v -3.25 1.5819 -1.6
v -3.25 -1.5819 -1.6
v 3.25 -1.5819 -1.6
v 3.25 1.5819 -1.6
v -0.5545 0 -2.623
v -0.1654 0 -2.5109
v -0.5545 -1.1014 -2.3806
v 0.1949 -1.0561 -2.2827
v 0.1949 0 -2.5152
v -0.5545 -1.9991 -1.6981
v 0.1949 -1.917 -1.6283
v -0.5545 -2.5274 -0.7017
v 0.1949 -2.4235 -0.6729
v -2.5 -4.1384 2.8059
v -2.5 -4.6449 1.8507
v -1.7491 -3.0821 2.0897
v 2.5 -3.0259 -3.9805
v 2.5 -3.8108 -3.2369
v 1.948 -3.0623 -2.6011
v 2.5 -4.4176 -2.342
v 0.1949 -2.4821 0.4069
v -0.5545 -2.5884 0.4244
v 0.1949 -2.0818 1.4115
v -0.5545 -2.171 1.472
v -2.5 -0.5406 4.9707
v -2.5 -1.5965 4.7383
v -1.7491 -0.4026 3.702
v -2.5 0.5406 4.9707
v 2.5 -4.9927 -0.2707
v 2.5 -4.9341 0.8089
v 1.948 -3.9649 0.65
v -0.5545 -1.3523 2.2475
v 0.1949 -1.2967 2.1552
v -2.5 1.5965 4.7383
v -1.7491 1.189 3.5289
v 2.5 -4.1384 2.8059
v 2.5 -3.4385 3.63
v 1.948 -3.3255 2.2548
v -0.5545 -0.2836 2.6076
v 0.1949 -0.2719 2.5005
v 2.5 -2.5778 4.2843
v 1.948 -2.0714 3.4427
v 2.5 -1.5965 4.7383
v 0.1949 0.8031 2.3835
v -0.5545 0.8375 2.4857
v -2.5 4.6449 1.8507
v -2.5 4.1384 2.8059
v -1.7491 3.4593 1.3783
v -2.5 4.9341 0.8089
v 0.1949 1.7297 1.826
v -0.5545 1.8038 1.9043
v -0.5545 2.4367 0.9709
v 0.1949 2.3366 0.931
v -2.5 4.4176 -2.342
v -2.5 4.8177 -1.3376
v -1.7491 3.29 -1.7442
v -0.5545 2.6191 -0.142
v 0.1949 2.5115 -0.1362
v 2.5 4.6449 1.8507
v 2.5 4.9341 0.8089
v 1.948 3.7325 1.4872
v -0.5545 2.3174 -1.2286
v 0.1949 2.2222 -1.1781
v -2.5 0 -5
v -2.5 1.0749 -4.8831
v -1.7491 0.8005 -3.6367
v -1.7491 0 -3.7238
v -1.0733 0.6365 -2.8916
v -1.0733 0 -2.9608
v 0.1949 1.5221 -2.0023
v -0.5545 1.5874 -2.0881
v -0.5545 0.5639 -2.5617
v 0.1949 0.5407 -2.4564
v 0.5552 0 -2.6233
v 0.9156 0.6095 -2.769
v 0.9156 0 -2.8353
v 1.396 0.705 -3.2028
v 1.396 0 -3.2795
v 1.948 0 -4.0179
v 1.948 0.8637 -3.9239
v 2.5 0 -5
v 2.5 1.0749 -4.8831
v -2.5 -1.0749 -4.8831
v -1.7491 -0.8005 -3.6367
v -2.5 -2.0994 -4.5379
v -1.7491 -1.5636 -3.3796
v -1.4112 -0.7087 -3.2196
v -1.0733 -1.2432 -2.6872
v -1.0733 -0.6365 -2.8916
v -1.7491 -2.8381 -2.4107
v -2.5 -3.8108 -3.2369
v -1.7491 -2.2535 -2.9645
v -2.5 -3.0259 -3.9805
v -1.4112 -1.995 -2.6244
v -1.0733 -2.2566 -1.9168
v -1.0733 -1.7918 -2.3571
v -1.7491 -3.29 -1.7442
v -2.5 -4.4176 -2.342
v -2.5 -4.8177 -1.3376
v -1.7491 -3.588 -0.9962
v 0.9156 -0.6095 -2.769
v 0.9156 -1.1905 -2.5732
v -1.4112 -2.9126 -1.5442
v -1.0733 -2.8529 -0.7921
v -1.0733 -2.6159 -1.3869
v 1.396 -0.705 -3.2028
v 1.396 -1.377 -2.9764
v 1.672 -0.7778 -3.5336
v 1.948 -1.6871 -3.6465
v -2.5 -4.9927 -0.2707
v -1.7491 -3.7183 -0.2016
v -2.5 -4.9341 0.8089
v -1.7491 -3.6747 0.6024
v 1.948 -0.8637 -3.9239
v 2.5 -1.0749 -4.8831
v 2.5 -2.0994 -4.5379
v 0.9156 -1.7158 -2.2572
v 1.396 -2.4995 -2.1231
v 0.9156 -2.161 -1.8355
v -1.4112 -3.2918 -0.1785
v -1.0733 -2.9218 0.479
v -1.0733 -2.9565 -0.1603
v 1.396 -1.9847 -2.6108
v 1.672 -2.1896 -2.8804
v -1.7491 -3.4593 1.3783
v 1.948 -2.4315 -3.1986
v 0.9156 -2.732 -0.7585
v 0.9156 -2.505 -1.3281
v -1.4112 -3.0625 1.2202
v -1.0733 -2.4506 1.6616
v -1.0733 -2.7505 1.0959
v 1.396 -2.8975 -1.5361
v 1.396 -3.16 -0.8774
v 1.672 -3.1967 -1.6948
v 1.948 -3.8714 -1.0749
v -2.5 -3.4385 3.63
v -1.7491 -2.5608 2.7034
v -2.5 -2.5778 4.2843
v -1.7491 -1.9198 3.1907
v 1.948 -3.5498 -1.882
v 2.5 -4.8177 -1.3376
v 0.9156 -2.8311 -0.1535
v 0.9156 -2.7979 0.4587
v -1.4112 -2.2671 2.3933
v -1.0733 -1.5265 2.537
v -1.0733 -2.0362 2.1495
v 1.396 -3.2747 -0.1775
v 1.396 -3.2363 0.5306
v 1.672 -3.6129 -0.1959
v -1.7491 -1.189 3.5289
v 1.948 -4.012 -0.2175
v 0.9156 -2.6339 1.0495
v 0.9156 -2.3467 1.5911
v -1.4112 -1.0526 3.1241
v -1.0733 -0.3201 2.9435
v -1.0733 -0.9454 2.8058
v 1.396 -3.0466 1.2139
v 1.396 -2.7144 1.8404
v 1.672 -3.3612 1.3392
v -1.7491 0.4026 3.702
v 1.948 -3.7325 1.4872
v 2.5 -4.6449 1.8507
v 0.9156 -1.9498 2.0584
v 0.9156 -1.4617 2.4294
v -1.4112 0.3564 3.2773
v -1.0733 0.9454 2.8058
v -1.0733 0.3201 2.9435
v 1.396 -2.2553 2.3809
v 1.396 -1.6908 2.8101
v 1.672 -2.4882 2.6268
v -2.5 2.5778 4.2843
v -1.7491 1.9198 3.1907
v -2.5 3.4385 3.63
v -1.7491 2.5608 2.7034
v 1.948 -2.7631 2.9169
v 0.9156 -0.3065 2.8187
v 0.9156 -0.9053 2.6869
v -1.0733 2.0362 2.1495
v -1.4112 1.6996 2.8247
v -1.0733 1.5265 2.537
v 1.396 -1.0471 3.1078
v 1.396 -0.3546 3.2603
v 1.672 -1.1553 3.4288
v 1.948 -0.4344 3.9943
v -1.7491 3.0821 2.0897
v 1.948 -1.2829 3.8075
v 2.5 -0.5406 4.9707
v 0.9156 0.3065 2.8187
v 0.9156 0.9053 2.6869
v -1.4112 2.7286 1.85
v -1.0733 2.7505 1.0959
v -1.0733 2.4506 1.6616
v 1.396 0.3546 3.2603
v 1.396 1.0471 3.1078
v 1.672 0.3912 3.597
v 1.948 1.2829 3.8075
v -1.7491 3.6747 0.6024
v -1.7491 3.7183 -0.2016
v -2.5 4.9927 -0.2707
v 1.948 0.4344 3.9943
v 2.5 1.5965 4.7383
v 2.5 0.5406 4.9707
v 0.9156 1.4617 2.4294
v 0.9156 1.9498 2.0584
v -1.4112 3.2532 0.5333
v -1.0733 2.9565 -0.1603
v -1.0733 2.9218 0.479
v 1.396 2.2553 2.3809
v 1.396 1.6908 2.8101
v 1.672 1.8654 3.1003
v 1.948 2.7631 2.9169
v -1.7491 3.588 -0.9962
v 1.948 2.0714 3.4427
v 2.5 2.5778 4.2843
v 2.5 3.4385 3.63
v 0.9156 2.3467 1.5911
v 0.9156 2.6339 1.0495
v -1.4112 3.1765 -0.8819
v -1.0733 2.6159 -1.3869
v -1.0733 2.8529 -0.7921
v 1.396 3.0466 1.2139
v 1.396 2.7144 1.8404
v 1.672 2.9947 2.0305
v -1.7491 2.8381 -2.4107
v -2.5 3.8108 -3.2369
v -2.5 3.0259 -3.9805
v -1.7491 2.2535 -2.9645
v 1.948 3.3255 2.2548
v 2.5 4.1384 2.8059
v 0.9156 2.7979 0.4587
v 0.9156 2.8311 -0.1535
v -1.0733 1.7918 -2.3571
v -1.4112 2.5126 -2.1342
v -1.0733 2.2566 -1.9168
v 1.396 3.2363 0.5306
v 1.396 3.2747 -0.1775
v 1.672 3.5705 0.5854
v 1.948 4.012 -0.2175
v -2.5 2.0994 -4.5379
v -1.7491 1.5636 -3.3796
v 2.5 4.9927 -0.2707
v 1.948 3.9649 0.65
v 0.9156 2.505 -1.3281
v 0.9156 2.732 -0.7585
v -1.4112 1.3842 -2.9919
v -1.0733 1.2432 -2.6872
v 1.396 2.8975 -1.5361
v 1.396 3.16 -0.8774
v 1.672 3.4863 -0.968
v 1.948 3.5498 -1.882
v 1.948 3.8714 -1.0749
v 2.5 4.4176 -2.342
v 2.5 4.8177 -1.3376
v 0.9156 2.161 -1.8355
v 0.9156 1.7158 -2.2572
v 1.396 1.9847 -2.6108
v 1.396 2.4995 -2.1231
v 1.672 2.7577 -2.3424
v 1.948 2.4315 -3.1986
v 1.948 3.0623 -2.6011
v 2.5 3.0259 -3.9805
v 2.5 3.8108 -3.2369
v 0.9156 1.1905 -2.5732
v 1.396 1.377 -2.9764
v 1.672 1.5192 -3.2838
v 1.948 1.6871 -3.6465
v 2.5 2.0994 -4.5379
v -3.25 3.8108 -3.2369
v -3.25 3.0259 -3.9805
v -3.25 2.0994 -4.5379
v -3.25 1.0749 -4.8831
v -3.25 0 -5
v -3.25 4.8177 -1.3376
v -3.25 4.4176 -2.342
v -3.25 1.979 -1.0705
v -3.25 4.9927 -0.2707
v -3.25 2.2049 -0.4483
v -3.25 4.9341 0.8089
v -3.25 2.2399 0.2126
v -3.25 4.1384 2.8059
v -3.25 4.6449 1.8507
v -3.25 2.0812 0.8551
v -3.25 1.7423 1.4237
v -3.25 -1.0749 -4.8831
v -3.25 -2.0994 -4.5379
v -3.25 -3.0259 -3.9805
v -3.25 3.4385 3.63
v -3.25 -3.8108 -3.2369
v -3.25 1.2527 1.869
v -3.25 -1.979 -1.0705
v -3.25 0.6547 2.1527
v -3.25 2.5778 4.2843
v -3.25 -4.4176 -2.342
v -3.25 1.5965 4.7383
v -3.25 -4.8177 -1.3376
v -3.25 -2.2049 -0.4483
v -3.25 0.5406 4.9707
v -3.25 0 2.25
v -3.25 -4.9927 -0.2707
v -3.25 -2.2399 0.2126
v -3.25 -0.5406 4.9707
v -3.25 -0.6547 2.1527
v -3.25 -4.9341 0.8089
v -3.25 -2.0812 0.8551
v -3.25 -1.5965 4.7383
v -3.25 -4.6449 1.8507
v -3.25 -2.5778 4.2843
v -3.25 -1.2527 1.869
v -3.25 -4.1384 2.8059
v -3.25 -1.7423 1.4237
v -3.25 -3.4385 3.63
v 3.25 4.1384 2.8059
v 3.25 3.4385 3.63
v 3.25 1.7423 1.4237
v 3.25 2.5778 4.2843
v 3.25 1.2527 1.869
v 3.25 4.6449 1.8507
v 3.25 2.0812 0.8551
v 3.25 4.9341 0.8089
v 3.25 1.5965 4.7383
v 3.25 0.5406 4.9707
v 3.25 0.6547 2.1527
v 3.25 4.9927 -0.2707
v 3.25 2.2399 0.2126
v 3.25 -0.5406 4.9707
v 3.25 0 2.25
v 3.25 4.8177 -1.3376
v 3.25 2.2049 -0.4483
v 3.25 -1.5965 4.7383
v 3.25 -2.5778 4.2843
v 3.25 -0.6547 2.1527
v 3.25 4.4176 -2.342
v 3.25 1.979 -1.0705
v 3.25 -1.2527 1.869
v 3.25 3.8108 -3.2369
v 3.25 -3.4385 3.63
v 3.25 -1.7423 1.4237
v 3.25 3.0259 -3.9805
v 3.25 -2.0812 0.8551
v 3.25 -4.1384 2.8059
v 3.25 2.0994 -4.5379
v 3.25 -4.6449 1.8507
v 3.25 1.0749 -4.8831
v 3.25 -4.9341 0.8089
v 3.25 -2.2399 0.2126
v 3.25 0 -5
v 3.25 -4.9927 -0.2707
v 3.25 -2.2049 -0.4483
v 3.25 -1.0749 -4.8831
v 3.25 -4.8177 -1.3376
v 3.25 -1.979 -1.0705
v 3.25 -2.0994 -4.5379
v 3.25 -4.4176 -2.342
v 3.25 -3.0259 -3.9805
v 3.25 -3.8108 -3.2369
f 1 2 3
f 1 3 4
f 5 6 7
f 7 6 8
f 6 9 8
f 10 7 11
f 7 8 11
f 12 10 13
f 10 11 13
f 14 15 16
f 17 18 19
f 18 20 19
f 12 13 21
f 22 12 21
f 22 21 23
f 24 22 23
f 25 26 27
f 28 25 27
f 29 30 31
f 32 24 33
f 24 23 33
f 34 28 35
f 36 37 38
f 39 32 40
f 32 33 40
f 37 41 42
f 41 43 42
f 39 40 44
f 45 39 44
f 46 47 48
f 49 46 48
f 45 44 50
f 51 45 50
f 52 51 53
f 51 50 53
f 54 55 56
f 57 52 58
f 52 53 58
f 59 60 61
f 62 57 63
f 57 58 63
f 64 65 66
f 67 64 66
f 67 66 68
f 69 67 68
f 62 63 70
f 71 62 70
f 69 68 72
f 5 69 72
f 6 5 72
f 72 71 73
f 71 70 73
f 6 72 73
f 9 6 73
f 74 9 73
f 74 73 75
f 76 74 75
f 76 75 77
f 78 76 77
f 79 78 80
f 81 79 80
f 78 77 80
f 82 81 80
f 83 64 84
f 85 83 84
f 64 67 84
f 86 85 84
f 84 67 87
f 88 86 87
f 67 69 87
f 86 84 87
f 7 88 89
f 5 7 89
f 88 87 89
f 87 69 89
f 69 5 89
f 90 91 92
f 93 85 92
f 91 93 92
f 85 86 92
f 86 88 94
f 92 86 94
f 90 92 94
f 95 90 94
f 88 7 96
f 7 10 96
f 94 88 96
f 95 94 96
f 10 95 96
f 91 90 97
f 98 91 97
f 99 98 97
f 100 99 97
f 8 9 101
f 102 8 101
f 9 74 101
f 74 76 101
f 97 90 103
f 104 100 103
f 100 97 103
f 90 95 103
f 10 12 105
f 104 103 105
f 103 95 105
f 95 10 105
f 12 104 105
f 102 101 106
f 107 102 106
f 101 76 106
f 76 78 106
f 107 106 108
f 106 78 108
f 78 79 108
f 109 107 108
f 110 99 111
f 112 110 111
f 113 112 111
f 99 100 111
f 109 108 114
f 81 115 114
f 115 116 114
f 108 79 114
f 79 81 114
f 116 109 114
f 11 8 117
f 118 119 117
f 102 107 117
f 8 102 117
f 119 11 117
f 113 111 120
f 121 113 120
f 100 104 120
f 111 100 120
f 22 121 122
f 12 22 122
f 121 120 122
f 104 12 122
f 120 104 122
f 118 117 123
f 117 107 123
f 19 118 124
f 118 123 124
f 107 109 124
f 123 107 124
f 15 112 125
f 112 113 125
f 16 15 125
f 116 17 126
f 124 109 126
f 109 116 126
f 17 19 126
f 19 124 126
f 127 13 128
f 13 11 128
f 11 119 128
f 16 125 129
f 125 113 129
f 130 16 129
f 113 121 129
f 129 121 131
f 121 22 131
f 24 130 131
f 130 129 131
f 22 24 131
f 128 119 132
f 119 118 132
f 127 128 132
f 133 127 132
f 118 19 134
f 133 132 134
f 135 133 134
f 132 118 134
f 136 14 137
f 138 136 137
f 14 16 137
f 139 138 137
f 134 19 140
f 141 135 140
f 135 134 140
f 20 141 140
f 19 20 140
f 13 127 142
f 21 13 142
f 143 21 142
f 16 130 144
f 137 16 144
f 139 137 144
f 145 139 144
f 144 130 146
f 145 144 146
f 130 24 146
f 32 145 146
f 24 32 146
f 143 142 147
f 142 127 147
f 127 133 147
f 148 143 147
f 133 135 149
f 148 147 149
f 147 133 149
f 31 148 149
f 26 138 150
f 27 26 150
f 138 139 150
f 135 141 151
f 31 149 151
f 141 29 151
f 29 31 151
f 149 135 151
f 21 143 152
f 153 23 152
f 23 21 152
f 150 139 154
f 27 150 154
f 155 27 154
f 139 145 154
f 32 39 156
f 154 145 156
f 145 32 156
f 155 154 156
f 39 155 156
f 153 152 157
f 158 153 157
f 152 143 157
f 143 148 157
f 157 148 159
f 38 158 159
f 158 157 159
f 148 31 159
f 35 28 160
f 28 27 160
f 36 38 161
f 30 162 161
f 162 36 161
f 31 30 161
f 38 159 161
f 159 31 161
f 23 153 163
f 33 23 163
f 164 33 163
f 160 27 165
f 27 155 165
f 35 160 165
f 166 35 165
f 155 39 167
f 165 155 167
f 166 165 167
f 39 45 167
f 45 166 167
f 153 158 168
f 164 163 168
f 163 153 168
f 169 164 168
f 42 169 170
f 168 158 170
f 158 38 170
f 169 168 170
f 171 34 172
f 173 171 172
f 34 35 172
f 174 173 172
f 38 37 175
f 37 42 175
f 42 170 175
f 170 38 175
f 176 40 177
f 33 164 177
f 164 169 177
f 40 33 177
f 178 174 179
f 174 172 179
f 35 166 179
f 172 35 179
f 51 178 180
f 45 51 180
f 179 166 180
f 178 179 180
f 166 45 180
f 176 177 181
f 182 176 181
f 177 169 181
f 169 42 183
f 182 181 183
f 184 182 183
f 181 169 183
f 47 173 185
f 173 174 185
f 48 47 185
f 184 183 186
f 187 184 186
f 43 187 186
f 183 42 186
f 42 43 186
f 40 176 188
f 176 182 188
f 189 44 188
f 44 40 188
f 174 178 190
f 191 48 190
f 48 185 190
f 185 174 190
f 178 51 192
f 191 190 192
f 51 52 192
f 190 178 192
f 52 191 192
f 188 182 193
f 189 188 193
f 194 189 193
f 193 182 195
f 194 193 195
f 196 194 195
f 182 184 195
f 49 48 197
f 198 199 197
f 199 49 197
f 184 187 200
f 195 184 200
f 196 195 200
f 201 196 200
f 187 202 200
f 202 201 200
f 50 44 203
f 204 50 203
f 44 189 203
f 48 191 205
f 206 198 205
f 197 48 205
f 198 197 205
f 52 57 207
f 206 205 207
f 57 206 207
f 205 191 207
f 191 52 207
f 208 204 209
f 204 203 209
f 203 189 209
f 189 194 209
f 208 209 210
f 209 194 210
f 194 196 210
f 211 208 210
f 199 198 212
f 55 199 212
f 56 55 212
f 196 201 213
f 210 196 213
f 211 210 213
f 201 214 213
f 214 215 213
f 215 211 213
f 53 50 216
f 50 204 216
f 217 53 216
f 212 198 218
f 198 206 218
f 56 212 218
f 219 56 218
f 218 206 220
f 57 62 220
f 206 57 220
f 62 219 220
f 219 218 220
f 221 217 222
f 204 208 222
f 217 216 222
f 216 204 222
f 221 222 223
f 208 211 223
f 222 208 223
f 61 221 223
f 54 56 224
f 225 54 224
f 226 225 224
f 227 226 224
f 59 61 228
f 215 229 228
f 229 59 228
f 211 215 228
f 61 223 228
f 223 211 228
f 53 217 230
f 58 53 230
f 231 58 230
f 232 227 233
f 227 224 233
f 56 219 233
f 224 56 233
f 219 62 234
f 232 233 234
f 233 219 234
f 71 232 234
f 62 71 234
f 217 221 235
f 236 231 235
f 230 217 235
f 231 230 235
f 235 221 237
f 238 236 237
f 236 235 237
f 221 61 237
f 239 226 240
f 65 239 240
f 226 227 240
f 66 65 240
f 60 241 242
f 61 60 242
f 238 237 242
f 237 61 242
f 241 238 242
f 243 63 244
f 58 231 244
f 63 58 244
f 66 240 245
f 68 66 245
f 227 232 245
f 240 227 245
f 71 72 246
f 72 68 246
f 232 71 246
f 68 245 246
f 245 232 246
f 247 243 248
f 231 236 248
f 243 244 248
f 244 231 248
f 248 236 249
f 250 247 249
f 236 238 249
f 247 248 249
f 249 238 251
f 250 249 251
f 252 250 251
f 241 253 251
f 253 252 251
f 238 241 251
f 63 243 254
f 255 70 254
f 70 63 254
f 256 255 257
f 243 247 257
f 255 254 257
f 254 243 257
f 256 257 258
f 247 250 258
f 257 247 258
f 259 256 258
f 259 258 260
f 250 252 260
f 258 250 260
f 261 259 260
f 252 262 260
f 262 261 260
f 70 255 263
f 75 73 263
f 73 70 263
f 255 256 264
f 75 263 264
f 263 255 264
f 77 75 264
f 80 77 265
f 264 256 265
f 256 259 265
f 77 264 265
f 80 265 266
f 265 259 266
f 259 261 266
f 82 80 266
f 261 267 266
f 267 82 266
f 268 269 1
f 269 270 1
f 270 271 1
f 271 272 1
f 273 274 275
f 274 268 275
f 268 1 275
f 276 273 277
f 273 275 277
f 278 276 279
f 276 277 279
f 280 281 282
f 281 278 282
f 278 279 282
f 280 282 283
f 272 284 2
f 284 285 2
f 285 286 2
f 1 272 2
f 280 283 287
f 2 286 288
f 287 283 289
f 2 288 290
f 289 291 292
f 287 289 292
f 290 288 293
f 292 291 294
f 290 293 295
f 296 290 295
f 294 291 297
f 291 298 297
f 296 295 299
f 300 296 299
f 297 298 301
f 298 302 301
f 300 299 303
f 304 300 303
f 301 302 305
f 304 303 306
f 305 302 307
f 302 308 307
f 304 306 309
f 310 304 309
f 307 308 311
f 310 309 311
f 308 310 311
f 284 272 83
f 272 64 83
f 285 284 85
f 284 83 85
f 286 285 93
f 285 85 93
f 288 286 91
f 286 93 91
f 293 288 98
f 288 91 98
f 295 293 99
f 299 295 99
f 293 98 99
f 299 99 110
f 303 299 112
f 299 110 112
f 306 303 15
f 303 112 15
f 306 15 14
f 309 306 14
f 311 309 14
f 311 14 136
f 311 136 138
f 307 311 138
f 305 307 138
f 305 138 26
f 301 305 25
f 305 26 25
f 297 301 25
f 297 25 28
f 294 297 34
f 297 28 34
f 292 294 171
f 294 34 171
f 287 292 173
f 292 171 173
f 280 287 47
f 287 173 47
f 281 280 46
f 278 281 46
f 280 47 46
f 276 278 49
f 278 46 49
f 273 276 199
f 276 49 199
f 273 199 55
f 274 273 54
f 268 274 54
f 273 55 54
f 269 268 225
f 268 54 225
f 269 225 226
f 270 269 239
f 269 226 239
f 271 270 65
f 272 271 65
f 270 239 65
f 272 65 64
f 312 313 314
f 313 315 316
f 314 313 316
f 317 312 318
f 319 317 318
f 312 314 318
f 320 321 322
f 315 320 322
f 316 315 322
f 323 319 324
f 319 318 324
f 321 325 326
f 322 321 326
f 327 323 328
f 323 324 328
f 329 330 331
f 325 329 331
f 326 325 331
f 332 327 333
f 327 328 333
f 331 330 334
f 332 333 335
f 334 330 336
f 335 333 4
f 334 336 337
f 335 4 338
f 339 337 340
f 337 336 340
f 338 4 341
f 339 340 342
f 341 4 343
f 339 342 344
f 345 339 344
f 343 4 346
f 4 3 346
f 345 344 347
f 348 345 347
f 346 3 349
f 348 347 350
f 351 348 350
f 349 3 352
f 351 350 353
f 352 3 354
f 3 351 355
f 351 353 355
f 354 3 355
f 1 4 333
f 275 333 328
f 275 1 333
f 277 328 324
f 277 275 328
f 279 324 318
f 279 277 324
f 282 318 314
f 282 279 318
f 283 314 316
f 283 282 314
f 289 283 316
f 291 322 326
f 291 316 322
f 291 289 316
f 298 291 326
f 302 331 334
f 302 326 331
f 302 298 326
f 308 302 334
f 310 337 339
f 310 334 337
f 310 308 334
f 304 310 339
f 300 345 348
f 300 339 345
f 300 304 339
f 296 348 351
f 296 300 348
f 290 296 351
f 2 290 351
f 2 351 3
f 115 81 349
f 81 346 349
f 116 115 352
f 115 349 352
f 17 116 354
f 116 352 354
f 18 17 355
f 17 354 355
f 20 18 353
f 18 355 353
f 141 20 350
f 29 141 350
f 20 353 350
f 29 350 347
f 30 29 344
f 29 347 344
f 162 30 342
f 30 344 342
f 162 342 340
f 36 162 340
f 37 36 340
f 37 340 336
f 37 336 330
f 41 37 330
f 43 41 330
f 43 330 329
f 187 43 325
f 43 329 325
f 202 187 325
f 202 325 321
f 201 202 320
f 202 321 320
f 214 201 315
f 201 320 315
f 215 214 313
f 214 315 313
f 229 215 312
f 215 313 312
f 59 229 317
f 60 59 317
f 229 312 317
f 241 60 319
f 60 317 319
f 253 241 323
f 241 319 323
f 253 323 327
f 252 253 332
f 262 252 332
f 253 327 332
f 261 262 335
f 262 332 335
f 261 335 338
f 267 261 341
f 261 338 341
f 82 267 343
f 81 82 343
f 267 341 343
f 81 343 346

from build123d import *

# Parameters (mm, degrees)
CUT_EXTRUDE1_DEPTH = 10


with BuildPart() as part:
    # Sketch1 → Revolve1 (revolve)
    with BuildSketch(Plane(origin=(0, 0, 0), x_dir=(1, 0, 0), z_dir=(0, 1, 0))):
        with BuildLine():
            Line((0, 0), (-2.5, 0))
            Line((-2.5, 0), (-3.25, 0))
            Line((-3.25, 0), (-3.25, 5))
            Line((-3.25, 5), (-2.5, 5))
            add(Edge.make_bspline(
                [(-2.5, 5), (-9.44e-07, 0), (2.5, 5)],
                knots=[0, 0, 0, 1, 1, 1], degree=2))
            Line((2.5, 5), (3.25, 5))
            Line((3.25, 5), (3.25, 0))
            Line((3.25, 0), (2.5, 0))
            Line((2.5, 0), (0, 0))
        make_face()
    revolve(axis=Axis((0, 0, 0), (-1, 0, 0)))

    # Sketch2 → Cut-Extrude1 (cut)
    with BuildSketch(Plane.ZY.offset(3.25)):
        with BuildLine():
            Line((-1.6, -1.581929202), (-1.6, 1.581929202))
            ThreePointArc((-1.6, 1.581929202), (2.25, 0), (-1.6, -1.581929202))
        make_face()
    extrude(amount=-CUT_EXTRUDE1_DEPTH, mode=Mode.SUBTRACT)


solid = part.part
